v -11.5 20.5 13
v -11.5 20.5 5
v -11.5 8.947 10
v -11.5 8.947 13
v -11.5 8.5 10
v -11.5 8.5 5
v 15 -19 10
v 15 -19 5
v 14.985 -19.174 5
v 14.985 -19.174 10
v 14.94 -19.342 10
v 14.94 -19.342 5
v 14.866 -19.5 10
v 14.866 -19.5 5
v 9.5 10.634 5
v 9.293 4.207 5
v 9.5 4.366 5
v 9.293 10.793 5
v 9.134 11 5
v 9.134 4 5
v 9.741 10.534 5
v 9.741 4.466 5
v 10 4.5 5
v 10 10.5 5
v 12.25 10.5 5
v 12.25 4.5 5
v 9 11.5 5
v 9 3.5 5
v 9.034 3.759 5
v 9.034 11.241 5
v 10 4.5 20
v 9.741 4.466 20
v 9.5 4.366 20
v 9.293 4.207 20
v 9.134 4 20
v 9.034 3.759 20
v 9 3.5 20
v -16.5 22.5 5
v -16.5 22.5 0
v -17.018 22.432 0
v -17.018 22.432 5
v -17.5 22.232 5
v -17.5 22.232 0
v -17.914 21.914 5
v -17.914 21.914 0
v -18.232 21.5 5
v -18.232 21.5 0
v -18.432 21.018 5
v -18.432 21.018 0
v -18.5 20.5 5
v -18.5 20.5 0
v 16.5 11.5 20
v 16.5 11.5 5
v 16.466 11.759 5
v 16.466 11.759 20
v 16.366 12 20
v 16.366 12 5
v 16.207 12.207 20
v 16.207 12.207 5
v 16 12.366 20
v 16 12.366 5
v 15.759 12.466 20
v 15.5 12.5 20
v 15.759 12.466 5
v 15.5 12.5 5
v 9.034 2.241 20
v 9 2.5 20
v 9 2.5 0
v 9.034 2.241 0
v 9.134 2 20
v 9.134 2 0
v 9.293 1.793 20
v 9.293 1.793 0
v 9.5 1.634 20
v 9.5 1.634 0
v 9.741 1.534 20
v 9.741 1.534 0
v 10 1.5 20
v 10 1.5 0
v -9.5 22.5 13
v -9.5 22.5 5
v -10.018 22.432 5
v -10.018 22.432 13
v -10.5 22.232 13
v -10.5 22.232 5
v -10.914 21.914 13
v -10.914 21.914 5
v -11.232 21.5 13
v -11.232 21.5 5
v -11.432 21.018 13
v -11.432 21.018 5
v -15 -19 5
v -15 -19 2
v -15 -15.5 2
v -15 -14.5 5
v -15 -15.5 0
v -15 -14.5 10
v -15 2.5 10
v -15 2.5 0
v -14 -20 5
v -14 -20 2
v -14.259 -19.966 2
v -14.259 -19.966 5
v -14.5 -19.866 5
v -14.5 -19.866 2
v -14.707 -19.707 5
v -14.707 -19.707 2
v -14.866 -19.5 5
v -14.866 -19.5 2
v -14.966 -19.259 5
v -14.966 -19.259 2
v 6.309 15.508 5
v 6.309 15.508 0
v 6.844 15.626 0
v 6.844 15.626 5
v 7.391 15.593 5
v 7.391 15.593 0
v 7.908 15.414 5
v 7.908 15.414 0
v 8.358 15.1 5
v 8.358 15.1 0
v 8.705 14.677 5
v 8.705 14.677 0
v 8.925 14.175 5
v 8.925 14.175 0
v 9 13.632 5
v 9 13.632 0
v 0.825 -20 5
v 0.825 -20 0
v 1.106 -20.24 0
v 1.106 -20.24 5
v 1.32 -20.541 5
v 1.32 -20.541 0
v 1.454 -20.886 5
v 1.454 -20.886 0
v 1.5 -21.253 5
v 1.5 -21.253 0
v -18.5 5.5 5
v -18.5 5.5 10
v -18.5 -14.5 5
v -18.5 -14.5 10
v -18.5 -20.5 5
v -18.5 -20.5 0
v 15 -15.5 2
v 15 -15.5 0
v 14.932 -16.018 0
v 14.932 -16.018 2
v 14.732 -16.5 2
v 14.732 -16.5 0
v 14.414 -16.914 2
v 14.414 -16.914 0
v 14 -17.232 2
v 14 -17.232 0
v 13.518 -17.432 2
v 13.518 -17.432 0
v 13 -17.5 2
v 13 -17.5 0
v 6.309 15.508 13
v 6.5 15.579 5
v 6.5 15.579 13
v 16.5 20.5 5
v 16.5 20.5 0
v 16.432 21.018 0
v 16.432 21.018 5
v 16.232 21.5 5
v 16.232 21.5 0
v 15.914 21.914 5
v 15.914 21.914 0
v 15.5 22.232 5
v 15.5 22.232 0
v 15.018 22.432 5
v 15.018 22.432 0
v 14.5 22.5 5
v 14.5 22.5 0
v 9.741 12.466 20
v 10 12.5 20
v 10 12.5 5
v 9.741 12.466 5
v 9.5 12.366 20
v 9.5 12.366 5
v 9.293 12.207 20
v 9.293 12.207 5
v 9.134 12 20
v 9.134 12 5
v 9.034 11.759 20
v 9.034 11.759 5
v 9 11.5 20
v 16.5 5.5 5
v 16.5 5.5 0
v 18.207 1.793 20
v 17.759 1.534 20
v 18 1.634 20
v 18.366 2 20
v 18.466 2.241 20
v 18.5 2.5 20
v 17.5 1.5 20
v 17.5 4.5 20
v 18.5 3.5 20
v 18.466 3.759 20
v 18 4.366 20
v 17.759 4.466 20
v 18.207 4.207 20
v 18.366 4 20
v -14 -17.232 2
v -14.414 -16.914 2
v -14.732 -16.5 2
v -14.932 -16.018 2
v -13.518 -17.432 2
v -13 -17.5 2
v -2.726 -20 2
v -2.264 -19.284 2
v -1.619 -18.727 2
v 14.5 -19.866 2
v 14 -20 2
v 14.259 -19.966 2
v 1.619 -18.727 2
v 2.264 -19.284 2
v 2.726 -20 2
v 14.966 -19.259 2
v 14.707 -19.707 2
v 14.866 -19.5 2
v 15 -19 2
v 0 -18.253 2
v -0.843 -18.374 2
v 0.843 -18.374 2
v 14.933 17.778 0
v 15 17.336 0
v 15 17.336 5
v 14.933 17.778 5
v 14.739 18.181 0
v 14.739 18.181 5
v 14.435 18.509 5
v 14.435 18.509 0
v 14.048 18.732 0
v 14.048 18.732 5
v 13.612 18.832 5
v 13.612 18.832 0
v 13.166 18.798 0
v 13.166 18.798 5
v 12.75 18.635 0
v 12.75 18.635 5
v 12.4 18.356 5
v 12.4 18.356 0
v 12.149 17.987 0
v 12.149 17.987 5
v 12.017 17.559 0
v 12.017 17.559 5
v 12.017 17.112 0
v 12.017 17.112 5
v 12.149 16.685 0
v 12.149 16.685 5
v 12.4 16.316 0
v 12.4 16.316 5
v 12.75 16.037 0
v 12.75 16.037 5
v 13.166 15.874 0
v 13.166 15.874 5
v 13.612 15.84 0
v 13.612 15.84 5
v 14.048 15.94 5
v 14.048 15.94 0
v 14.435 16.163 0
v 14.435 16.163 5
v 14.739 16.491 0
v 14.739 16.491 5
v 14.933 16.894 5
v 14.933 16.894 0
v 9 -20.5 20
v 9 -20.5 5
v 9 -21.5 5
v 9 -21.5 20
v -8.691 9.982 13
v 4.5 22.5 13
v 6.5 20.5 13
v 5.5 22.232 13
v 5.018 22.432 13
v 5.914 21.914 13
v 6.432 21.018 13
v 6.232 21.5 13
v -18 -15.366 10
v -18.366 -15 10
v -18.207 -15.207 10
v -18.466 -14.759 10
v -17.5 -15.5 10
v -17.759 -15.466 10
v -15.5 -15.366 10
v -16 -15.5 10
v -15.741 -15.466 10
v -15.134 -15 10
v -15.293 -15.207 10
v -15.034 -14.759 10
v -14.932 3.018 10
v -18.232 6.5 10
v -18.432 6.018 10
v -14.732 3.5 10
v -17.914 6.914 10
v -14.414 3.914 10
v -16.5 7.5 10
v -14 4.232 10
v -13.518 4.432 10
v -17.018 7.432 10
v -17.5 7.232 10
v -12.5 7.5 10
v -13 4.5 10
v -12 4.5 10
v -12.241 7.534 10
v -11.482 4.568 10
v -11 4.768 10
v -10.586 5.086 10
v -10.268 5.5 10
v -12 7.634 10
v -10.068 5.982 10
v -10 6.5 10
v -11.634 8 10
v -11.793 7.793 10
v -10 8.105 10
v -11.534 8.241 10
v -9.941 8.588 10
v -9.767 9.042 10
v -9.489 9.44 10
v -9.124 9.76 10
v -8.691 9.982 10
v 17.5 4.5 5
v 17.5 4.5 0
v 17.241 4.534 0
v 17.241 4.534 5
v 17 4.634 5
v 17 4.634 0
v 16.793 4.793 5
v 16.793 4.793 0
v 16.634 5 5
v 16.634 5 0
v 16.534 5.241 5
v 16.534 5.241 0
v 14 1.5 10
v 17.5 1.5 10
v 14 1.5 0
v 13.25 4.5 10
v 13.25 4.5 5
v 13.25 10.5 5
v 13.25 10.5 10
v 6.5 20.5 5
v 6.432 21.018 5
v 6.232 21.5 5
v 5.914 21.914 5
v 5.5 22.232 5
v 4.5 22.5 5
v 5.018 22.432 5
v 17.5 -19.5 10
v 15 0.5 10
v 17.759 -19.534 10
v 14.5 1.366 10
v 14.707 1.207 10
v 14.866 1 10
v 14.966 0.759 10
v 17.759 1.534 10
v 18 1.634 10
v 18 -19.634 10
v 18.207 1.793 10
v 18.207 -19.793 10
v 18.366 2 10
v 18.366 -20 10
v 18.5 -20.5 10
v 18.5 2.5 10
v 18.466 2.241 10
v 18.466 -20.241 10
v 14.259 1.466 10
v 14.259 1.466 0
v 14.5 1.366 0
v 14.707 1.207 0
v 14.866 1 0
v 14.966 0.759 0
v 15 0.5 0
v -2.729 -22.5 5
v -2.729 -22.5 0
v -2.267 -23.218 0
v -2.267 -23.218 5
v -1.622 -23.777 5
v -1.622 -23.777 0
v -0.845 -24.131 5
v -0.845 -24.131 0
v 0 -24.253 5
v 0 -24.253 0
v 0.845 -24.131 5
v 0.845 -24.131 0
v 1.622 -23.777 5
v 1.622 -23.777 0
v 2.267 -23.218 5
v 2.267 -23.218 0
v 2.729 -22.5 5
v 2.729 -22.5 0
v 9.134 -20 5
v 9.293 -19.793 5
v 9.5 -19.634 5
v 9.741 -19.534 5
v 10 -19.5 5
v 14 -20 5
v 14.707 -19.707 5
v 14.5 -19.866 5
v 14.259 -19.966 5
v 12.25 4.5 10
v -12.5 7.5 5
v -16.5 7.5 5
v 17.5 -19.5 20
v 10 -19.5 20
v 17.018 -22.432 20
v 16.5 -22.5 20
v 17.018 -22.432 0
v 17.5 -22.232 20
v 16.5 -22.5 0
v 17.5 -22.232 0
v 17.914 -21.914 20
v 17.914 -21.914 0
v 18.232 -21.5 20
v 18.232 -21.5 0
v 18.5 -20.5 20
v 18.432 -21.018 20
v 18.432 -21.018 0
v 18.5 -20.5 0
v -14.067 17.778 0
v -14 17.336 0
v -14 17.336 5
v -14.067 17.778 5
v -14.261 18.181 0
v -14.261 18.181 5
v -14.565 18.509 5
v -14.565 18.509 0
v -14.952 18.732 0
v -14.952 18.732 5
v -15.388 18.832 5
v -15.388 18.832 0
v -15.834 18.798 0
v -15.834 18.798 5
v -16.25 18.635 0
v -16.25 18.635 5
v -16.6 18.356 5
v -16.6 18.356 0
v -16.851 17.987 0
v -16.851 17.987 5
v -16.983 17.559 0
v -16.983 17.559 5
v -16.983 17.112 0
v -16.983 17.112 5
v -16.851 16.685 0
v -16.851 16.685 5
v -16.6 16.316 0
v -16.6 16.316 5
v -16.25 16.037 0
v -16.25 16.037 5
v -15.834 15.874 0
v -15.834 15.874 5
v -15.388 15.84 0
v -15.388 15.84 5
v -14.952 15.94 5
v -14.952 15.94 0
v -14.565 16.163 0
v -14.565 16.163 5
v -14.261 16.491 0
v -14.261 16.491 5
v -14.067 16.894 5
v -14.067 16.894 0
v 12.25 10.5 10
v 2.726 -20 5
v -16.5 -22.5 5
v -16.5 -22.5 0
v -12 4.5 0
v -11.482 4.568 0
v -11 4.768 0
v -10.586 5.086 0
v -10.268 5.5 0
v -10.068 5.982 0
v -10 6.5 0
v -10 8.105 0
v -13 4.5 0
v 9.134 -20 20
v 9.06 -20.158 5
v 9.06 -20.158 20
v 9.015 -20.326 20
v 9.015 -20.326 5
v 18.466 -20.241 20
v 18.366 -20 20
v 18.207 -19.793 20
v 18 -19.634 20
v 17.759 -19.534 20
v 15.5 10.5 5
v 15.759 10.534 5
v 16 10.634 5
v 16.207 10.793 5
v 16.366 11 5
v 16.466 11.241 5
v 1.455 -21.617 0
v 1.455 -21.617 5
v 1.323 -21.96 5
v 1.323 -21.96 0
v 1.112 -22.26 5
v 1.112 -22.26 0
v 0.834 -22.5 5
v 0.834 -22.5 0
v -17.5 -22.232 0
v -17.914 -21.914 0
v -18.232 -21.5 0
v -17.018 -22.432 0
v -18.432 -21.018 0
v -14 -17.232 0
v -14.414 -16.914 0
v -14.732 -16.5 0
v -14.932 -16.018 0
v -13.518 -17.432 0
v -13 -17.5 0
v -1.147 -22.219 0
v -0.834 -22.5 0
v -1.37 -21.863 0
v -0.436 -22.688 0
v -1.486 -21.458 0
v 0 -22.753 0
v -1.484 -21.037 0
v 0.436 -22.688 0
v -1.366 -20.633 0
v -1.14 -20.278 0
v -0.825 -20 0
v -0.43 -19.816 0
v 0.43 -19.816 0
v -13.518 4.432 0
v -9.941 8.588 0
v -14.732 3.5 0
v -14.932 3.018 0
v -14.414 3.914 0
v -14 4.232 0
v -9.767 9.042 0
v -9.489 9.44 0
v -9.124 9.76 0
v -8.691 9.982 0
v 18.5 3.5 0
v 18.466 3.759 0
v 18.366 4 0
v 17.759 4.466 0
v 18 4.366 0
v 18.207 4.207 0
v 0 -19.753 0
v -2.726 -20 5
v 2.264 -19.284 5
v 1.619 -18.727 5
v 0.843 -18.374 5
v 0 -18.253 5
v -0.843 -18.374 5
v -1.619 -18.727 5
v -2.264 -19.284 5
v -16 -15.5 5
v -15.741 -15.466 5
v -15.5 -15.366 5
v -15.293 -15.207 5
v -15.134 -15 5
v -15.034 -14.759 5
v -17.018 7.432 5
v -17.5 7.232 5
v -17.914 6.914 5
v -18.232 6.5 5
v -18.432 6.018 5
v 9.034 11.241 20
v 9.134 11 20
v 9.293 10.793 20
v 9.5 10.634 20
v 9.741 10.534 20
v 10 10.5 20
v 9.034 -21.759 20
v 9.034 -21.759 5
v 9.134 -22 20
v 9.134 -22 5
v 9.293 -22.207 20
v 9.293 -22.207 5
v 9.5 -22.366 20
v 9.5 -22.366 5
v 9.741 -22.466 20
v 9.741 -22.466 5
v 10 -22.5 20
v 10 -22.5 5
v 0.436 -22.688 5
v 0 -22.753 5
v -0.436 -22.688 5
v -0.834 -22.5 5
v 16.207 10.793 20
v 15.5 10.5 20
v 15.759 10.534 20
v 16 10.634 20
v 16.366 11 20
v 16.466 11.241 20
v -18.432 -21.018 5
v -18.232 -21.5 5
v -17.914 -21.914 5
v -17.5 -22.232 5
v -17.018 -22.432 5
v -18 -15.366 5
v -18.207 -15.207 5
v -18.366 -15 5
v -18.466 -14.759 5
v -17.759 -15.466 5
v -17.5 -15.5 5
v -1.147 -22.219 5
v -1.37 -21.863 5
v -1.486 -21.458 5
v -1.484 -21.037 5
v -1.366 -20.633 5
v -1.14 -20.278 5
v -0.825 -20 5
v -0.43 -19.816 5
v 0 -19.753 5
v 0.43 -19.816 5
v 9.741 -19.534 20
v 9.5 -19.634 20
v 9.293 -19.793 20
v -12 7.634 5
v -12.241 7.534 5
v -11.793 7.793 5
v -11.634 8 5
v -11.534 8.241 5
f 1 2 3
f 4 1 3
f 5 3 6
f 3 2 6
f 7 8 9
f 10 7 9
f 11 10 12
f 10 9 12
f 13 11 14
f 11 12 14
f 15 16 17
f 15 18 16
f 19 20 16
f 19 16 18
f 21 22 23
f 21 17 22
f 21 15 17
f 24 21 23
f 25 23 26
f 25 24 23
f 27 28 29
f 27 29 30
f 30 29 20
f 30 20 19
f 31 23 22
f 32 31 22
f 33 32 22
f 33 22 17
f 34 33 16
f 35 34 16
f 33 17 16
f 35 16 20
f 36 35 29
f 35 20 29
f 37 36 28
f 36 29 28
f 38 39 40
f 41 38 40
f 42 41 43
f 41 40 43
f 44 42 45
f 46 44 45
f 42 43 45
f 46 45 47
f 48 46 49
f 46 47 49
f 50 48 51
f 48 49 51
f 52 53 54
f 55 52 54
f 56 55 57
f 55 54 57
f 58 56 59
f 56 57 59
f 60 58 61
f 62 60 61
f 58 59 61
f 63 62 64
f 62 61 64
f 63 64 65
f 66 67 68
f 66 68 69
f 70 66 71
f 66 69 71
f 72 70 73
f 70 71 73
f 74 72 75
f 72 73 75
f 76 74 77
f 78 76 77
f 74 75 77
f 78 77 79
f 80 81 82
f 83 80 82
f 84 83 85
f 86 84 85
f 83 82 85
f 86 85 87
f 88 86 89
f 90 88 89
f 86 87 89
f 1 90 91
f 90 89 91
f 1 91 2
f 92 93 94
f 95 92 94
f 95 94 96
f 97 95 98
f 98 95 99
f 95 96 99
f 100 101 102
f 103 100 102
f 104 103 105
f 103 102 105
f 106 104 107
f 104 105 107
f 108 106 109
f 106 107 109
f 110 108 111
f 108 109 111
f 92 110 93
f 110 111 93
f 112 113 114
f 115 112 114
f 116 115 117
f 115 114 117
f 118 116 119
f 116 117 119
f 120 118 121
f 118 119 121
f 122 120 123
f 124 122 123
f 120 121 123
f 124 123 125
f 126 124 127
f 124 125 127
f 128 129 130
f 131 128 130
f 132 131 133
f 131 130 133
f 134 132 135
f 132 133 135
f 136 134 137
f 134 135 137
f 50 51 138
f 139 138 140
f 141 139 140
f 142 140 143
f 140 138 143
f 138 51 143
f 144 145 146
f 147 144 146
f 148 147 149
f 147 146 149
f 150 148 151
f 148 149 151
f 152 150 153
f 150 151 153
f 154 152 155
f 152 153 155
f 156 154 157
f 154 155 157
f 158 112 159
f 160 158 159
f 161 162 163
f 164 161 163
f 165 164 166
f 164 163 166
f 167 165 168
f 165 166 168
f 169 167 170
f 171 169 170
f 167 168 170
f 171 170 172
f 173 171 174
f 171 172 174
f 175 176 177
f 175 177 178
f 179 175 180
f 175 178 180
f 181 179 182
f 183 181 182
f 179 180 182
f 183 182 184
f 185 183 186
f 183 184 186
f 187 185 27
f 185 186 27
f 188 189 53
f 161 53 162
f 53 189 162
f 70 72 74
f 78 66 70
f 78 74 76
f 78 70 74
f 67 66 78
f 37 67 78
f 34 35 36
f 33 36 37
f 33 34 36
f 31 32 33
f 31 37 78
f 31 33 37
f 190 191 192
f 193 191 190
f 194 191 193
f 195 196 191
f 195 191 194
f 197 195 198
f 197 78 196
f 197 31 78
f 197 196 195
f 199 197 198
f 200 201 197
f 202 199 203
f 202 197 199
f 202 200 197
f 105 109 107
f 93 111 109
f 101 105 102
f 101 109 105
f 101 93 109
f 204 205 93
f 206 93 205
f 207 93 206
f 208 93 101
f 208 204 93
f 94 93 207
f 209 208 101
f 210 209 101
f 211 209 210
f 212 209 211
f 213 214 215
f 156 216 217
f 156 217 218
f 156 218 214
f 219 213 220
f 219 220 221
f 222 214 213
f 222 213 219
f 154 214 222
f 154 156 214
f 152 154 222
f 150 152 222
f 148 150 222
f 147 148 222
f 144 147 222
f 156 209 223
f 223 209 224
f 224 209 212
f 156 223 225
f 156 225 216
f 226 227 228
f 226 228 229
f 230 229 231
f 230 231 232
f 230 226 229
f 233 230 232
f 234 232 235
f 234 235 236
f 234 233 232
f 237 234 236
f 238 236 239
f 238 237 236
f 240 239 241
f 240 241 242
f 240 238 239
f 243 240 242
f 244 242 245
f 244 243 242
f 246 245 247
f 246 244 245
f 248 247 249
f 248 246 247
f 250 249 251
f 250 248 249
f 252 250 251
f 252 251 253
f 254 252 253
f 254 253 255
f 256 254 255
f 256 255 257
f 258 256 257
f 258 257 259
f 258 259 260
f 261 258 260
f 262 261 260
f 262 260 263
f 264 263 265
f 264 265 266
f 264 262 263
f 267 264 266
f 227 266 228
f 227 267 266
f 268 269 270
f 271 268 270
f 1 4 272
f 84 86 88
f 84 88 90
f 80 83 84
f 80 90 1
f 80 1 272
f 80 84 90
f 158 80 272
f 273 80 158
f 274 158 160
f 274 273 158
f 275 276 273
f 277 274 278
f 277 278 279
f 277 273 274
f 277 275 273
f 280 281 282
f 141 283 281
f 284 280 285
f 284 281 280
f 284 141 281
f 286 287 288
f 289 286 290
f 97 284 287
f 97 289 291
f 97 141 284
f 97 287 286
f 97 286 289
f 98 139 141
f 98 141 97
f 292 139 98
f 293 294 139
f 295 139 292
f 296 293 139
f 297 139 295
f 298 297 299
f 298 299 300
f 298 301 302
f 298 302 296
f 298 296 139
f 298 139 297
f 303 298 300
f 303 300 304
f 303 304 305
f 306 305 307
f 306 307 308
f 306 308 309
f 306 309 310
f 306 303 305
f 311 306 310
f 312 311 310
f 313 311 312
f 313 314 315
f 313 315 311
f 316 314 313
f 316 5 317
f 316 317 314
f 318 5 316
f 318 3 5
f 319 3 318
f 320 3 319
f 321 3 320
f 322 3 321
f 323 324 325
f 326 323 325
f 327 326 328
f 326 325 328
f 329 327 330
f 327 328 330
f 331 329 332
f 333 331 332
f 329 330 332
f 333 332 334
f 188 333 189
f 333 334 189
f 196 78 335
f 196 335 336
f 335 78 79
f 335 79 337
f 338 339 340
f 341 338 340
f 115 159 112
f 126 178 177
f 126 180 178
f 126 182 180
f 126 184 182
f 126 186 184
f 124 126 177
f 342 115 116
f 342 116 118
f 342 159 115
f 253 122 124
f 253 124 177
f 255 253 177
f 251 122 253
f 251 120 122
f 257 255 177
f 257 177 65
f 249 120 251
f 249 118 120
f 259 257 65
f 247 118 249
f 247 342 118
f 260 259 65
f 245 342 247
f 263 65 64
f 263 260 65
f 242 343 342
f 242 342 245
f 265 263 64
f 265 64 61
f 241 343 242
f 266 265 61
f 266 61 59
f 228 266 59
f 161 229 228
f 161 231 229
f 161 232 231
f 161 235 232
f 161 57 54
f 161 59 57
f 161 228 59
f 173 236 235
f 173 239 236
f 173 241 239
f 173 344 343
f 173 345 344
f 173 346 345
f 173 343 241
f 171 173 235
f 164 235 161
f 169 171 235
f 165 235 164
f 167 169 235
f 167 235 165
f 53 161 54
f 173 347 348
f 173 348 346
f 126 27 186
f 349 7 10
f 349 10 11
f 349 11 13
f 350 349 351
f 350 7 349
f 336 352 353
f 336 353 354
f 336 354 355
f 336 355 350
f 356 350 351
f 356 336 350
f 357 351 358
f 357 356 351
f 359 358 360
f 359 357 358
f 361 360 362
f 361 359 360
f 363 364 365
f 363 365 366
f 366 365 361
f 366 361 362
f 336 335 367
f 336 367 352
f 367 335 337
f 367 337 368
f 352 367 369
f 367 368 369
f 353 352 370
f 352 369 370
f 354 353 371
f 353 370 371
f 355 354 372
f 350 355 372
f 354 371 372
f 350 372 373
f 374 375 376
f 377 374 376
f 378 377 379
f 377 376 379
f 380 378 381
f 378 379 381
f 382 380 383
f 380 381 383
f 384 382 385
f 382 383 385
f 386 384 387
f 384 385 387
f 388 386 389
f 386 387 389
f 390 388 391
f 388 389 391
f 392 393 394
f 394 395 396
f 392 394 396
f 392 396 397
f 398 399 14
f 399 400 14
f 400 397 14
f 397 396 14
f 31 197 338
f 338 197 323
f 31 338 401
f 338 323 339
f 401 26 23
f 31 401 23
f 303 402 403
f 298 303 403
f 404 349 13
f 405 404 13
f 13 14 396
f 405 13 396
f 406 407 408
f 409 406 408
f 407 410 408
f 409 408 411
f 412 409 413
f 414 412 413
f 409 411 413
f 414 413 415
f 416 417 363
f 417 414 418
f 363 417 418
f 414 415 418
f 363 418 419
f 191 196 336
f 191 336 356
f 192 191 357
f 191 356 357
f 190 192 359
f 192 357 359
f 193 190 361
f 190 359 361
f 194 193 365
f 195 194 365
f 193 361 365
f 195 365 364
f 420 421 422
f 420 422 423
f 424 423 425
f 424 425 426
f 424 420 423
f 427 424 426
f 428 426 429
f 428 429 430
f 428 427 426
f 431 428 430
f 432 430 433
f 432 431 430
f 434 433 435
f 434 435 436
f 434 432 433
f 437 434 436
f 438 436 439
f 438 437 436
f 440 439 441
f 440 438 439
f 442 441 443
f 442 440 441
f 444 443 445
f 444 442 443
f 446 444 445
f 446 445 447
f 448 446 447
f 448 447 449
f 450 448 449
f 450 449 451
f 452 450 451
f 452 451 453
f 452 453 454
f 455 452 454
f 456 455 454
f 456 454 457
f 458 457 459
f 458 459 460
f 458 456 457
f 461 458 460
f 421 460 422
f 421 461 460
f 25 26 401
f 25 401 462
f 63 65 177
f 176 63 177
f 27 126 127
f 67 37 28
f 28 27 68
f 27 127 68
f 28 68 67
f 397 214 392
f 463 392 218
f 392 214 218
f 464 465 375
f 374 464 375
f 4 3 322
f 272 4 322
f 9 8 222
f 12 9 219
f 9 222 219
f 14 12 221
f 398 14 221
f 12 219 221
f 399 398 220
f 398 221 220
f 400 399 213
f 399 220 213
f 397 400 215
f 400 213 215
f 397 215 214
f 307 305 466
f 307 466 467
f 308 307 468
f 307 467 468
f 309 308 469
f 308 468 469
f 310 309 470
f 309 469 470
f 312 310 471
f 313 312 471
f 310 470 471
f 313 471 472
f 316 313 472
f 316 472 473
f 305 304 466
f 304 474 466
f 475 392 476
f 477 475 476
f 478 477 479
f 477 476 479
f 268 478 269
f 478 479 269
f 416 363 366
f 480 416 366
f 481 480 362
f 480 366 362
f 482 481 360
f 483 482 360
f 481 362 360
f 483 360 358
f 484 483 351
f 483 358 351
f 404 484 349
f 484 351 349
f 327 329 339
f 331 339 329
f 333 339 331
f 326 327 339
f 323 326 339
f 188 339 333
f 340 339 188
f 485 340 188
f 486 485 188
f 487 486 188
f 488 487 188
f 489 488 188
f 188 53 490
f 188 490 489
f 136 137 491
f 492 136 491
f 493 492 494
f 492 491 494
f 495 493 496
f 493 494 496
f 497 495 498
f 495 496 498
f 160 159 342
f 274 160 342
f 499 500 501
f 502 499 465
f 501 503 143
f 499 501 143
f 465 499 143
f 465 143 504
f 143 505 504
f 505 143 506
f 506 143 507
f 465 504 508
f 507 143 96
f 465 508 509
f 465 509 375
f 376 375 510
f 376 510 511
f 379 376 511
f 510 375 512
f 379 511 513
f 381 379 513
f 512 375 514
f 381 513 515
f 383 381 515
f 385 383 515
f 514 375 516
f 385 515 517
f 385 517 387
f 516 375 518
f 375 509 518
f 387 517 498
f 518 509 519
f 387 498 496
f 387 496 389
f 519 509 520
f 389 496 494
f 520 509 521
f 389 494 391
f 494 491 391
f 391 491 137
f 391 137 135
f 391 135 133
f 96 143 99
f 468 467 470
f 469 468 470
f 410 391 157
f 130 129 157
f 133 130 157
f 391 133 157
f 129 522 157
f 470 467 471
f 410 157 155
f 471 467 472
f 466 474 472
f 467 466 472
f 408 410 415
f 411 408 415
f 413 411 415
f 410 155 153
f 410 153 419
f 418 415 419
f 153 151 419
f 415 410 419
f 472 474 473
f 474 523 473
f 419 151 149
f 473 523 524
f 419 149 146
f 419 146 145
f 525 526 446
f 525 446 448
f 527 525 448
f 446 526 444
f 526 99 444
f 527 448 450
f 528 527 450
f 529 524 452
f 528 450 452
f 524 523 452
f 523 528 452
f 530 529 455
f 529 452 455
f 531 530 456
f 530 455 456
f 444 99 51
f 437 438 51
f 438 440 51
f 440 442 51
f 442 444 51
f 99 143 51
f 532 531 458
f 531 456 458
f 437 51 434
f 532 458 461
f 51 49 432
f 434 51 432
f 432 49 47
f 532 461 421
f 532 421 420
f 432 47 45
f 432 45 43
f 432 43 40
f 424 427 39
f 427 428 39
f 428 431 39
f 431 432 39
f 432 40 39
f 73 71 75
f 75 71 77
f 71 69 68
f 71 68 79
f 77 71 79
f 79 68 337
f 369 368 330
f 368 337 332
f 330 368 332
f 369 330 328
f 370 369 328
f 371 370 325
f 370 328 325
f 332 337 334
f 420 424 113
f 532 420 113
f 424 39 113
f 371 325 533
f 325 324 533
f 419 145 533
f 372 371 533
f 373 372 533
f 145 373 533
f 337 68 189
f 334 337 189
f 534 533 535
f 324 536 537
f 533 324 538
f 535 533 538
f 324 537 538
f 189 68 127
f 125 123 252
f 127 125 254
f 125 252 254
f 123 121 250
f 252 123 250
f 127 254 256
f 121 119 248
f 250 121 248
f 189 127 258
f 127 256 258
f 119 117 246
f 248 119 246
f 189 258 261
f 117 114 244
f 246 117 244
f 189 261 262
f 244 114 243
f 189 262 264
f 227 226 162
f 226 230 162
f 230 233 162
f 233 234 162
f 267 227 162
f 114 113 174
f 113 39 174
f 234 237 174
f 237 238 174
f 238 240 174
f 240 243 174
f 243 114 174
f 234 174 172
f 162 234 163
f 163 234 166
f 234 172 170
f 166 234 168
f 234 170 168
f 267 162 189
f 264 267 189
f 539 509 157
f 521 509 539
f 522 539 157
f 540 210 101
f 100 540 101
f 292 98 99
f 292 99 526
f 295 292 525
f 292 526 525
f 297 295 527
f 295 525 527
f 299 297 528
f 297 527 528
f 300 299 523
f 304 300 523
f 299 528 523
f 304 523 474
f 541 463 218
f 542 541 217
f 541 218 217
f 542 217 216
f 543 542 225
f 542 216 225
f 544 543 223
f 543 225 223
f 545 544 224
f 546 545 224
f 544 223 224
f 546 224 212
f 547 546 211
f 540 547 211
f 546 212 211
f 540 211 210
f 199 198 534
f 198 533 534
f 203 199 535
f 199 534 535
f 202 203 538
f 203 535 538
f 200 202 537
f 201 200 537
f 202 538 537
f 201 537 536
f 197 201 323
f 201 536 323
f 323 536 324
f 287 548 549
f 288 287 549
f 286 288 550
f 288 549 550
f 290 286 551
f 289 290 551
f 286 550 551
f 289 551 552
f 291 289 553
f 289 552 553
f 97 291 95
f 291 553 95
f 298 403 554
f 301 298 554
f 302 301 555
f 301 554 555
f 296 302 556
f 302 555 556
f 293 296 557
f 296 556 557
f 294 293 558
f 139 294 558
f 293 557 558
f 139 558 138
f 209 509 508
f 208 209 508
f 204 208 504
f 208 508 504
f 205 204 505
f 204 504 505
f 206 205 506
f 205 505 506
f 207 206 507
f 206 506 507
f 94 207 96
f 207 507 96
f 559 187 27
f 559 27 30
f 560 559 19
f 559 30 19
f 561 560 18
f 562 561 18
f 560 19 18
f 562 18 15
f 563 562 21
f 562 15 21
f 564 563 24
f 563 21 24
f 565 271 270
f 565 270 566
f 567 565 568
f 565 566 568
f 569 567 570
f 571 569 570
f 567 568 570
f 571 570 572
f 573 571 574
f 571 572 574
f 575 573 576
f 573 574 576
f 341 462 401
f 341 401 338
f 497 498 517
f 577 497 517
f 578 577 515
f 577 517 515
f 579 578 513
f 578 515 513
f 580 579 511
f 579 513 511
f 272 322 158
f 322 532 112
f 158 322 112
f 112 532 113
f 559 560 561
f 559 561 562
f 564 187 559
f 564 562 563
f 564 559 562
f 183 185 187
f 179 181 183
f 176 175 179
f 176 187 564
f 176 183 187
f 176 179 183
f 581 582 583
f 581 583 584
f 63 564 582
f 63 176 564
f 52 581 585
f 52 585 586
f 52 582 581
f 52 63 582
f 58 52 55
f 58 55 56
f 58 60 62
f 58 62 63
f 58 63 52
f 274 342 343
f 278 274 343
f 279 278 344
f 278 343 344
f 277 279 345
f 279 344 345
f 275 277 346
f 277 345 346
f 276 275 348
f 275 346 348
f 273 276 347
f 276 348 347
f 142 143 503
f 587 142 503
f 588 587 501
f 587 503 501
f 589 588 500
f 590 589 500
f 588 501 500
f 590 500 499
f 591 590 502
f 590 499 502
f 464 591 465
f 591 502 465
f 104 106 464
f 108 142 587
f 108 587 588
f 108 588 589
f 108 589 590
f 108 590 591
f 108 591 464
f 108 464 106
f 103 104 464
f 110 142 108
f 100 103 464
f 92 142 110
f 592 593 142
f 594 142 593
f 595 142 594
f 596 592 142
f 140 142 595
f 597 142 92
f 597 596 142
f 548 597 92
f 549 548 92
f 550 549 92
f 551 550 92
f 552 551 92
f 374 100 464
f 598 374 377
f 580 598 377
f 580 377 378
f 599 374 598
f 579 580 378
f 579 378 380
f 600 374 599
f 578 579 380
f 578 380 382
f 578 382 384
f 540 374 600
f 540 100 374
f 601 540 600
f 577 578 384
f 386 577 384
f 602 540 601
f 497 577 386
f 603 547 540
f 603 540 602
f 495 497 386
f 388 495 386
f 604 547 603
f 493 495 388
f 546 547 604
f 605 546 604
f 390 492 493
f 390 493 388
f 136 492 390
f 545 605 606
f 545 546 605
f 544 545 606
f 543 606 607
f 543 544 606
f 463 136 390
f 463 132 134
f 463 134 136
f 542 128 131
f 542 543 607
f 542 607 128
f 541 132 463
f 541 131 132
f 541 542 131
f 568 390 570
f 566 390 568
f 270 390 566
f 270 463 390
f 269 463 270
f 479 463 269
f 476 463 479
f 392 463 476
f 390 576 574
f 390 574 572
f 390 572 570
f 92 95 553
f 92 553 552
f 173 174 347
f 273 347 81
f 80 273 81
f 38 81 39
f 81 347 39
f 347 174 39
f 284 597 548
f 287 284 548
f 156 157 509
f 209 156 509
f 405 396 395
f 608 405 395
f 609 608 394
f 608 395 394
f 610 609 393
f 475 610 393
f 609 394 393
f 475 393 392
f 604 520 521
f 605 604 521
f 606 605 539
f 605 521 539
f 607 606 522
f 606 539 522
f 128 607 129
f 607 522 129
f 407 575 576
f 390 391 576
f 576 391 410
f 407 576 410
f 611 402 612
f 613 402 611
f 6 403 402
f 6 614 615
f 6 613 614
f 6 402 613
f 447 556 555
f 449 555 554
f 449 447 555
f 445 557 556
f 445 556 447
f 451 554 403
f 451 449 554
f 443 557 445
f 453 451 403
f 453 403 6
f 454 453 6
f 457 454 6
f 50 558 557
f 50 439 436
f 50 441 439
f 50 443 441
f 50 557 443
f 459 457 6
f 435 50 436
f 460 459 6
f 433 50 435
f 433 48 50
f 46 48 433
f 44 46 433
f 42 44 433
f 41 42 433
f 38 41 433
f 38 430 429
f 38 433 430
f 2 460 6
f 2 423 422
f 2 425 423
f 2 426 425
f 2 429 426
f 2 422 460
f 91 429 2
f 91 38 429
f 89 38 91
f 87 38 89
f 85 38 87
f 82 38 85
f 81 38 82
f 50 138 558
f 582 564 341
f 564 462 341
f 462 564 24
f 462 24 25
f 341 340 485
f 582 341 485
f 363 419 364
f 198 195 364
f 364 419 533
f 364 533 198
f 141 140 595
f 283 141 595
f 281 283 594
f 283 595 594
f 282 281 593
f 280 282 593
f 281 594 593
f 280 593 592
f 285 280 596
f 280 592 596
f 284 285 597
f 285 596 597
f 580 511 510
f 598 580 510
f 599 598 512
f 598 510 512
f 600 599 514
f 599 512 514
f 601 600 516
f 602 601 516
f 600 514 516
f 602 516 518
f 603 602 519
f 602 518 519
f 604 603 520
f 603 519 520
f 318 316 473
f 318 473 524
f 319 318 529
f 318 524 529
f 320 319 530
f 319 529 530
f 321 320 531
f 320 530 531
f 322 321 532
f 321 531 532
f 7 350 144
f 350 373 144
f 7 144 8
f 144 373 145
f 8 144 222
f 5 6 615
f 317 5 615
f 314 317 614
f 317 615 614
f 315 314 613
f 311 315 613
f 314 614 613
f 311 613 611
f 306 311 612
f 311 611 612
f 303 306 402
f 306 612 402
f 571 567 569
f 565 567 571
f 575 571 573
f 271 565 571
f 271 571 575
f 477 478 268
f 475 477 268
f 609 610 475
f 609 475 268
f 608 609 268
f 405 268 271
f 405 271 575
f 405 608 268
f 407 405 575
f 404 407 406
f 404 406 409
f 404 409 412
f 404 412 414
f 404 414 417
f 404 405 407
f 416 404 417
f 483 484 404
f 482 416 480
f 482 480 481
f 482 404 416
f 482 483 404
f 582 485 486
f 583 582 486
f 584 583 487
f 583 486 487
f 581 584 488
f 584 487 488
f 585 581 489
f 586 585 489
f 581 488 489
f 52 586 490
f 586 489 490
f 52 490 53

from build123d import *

# Parameters (mm, degrees)
F1_DEPTH = 2
F0_R     = 3
F0_R_2   = 1.5
F2_DEPTH = 5
F4_DEPTH = 5
F5_DEPTH = 8
F6_DEPTH = 15
F7_DEPTH = 15
F3_W     = 1
F3_H     = 6
F8_DEPTH = 5


with BuildPart() as f1:
    # F0 (on Top) → F1 (new body)
    with BuildSketch(Plane.XY):
        with BuildLine():
            Line((-14, -20), (-2.7258296596, -20))
            ThreePointArc((-2.7258296596, -20), (0, -18.2529376149), (2.7258296596, -20))
            Line((2.7258296596, -20), (14, -20))
            ThreePointArc((14, -20), (14.7071067812, -19.7071067812), (15, -19))
            Line((15, -19), (15, -15.5))
            ThreePointArc((15, -15.5), (14.4142135624, -16.9142135624), (13, -17.5))
            Line((13, -17.5), (-13, -17.5))
            ThreePointArc((-13, -17.5), (-14.4142135624, -16.9142135624), (-15, -15.5))
            Line((-15, -15.5), (-15, -19))
            ThreePointArc((-15, -19), (-14.7071067812, -19.7071067812), (-14, -20))
        make_face()
    extrude(amount=F1_DEPTH)

    # F0 (on Top) → F2 (join)
    with BuildSketch(Plane.XY):
        with BuildLine():
            ThreePointArc((16.5, 20.5), (15.9142135624, 21.9142135624), (14.5, 22.5))
            Line((14.5, 22.5), (-16.5, 22.5))
            ThreePointArc((-16.5, 22.5), (-17.9142135624, 21.9142135624), (-18.5, 20.5))
            Line((-18.5, 20.5), (-18.5, 17.3358949354))
            Line((-18.5, 17.3358949354), (-18.5, -20.5))
            ThreePointArc((-18.5, -20.5), (-17.9142135624, -21.9142135624), (-16.5, -22.5))
            Line((-16.5, -22.5), (-2.7285225687, -22.5))
            ThreePointArc((-2.7285225687, -22.5), (-2.9999982596, -21.2497061259), (-2.7258296596, -20))
            Line((-2.7258296596, -20), (-14, -20))
            ThreePointArc((-14, -20), (-14.7071067812, -19.7071067812), (-15, -19))
            Line((-15, -19), (-15, -15.5))
            Line((-15, -15.5), (-15, 2.5))
            ThreePointArc((-15, 2.5), (-14.4142135624, 3.9142135624), (-13, 4.5))
            Line((-13, 4.5), (-12, 4.5))
            ThreePointArc((-12, 4.5), (-10.5857864376, 5.0857864376), (-10, 6.5))
            Line((-10, 6.5), (-10, 8.1054256072))
            ThreePointArc((-10, 8.1054256072), (-9.6405519552, 9.2493614806), (-8.6914107177, 9.9821118409))
            Line((-8.6914107177, 9.9821118409), (6.3085892823, 15.5084276303))
            ThreePointArc((6.3085892823, 15.5084276303), (8.1439358734, 15.2722933519), (9, 13.6317413967))
            Line((9, 13.6317413967), (9, 2.5))
            ThreePointArc((9, 2.5), (9.2928932188, 1.7928932188), (10, 1.5))
            Line((10, 1.5), (14, 1.5))
            ThreePointArc((14, 1.5), (14.7071067812, 1.2071067812), (15, 0.5))
            Line((15, 0.5), (15, -15.5))
            Line((15, -15.5), (15, -19))
            ThreePointArc((15, -19), (14.7071067812, -19.7071067812), (14, -20))
            Line((14, -20), (2.7258296596, -20))
            ThreePointArc((2.7258296596, -20), (2.9306559828, -20.6116455515), (3, -21.2529376149))
            ThreePointArc((3, -21.2529376149), (2.9313450587, -21.8910725121), (2.7285225687, -22.5))
            Line((2.7285225687, -22.5), (16.5, -22.5))
            ThreePointArc((16.5, -22.5), (17.9142135624, -21.9142135624), (18.5, -20.5))
            Line((18.5, -20.5), (18.5, 3.5))
            ThreePointArc((18.5, 3.5), (18.2071067812, 4.2071067812), (17.5, 4.5))
            ThreePointArc((17.5, 4.5), (16.7928932188, 4.7928932188), (16.5, 5.5))
            Line((16.5, 5.5), (16.5, 17.3358949354))
            Line((16.5, 17.3358949354), (16.5, 20.5))
        make_face()
        with BuildLine():
            ThreePointArc((-12.5, 17.3358949354), (-15.5, 14.3358949354), (-18.5, 17.3358949354))
            ThreePointArc((-18.5, 17.3358949354), (-15.5, 20.3358949354), (-12.5, 17.3358949354))
        make_face(mode=Mode.SUBTRACT)
        with Locations((13.5, 17.3358949354)):
            Circle(F0_R, mode=Mode.SUBTRACT)
        with BuildLine():
            ThreePointArc((-2.7258296596, -20), (-2.9999982596, -21.2497061259), (-2.7285225687, -22.5))
            Line((-2.7285225687, -22.5), (-0.8335678783, -22.5))
            ThreePointArc((-0.8335678783, -22.5), (-1.4999905856, -21.2476231938), (-0.8247104541, -20))
            Line((-0.8247104541, -20), (-2.7258296596, -20))
        make_face()
        with BuildLine():
            Line((-0.8335678783, -22.5), (-2.7285225687, -22.5))
            ThreePointArc((-2.7285225687, -22.5), (0, -24.2529376149), (2.7285225687, -22.5))
            Line((2.7285225687, -22.5), (0.8335678783, -22.5))
            ThreePointArc((0.8335678783, -22.5), (0, -22.7529376149), (-0.8335678783, -22.5))
        make_face()
        with BuildLine():
            Line((0.8335678783, -22.5), (2.7285225687, -22.5))
            ThreePointArc((2.7285225687, -22.5), (2.9313450587, -21.8910725121), (3, -21.2529376149))
            ThreePointArc((3, -21.2529376149), (2.9306559828, -20.6116455515), (2.7258296596, -20))
            Line((2.7258296596, -20), (0.8247104541, -20))
            ThreePointArc((0.8247104541, -20), (1.3204290366, -20.5412725537), (1.5, -21.2529376149))
            ThreePointArc((1.5, -21.2529376149), (1.3229421411, -21.9599199989), (0.8335678783, -22.5))
        make_face()
        with BuildLine():
            ThreePointArc((2.7258296596, -20), (0, -18.2529376149), (-2.7258296596, -20))
            Line((-2.7258296596, -20), (-0.8247104541, -20))
            ThreePointArc((-0.8247104541, -20), (0, -19.7529376149), (0.8247104541, -20))
            Line((0.8247104541, -20), (2.7258296596, -20))
        make_face()
        with BuildLine():
            ThreePointArc((-12.5, 17.3358949354), (-15.5, 20.3358949354), (-18.5, 17.3358949354))
            ThreePointArc((-18.5, 17.3358949354), (-15.5, 14.3358949354), (-12.5, 17.3358949354))
        make_face()
        with Locations((-15.5, 17.3358949354)):
            Circle(F0_R_2, mode=Mode.SUBTRACT)
        with Locations((13.5, 17.3358949354)):
            Circle(F0_R)
        with Locations((13.5, 17.3358949354)):
            Circle(F0_R_2, mode=Mode.SUBTRACT)
    extrude(amount=F2_DEPTH)

    # F3 (on face) → F4 (join)
    with BuildSketch(Plane.XY.offset(5)):
        with BuildLine():
            ThreePointArc((-18.5, -14.5), (-18.2071067812, -15.2071067812), (-17.5, -15.5))
            Line((-17.5, -15.5), (-16, -15.5))
            ThreePointArc((-16, -15.5), (-15.2928932188, -15.2071067812), (-15, -14.5))
            Line((-15, -14.5), (-15, 2.5))
            ThreePointArc((-15, 2.5), (-14.4142135624, 3.9142135624), (-13, 4.5))
            Line((-13, 4.5), (-12, 4.5))
            ThreePointArc((-12, 4.5), (-10.5857864376, 5.0857864376), (-10, 6.5))
            Line((-10, 6.5), (-10, 8.1054256072))
            ThreePointArc((-10, 8.1054256072), (-9.6405519552, 9.2493614806), (-8.6914107177, 9.9821118409))
            Line((-8.6914107177, 9.9821118409), (-11.5, 8.9473684211))
            Line((-11.5, 8.9473684211), (-11.5, 8.5))
            ThreePointArc((-11.5, 8.5), (-11.7928932188, 7.7928932188), (-12.5, 7.5))
            Line((-12.5, 7.5), (-16.5, 7.5))
            ThreePointArc((-16.5, 7.5), (-17.9142135624, 6.9142135624), (-18.5, 5.5))
            Line((-18.5, 5.5), (-18.5, -14.5))
        make_face()
    extrude(amount=F4_DEPTH)

    # F3 (on face) → F5 (join)
    with BuildSketch(Plane.XY.offset(5)):
        with BuildLine():
            Line((4.5, 22.5), (-9.5, 22.5))
            ThreePointArc((-9.5, 22.5), (-10.9142135624, 21.9142135624), (-11.5, 20.5))
            Line((-11.5, 20.5), (-11.5, 8.9473684211))
            Line((-11.5, 8.9473684211), (-8.6914107177, 9.9821118409))
            Line((-8.6914107177, 9.9821118409), (6.3085892823, 15.5084276303))
            Line((6.3085892823, 15.5084276303), (6.5, 15.5789473684))
            Line((6.5, 15.5789473684), (6.5, 20.5))
            ThreePointArc((6.5, 20.5), (5.9142135624, 21.9142135624), (4.5, 22.5))
        make_face()
    extrude(amount=F5_DEPTH)

    # F3 (on face) → F6 (join)
    with BuildSketch(Plane.XY.offset(5)):
        with BuildLine():
            ThreePointArc((9, -21.5), (9.2928932188, -22.2071067812), (10, -22.5))
            Line((10, -22.5), (16.5, -22.5))
            ThreePointArc((16.5, -22.5), (17.9142135624, -21.9142135624), (18.5, -20.5))
            ThreePointArc((18.5, -20.5), (18.2071067812, -19.7928932188), (17.5, -19.5))
            Line((17.5, -19.5), (14.8660254038, -19.5))
            ThreePointArc((14.8660254038, -19.5), (14.5, -19.8660254038), (14, -20))
            Line((14, -20), (9.1339745962, -20))
            ThreePointArc((9.1339745962, -20), (9.0340741737, -20.2411809549), (9, -20.5))
            Line((9, -20.5), (9, -21.5))
        make_face()
        with BuildLine():
            ThreePointArc((10, -19.5), (9.5, -19.6339745962), (9.1339745962, -20))
            Line((9.1339745962, -20), (14, -20))
            ThreePointArc((14, -20), (14.5, -19.8660254038), (14.8660254038, -19.5))
            Line((14.8660254038, -19.5), (10, -19.5))
        make_face()
    extrude(amount=F6_DEPTH)

    # F3 (on face) → F7 (join)
    with BuildSketch(Plane.XY.offset(5)):
        with BuildLine():
            ThreePointArc((15.5, 10.5), (16.2071067812, 10.7928932188), (16.5, 11.5))
            ThreePointArc((16.5, 11.5), (16.2071067812, 12.2071067812), (15.5, 12.5))
            Line((15.5, 12.5), (10, 12.5))
            ThreePointArc((10, 12.5), (9.2928932188, 12.2071067812), (9, 11.5))
            ThreePointArc((9, 11.5), (9.2928932188, 10.7928932188), (10, 10.5))
            Line((10, 10.5), (12.25, 10.5))
            Line((12.25, 10.5), (13.25, 10.5))
            Line((13.25, 10.5), (15.5, 10.5))
        make_face()
        with BuildLine():
            ThreePointArc((17.5, 1.5), (18.2071067812, 1.7928932188), (18.5, 2.5))
            Line((18.5, 2.5), (18.5, 3.5))
            ThreePointArc((18.5, 3.5), (18.2071067812, 4.2071067812), (17.5, 4.5))
            Line((17.5, 4.5), (13.25, 4.5))
            Line((13.25, 4.5), (12.25, 4.5))
            Line((12.25, 4.5), (10, 4.5))
            ThreePointArc((10, 4.5), (9.2928932188, 4.2071067812), (9, 3.5))
            Line((9, 3.5), (9, 2.5))
            ThreePointArc((9, 2.5), (9.2928932188, 1.7928932188), (10, 1.5))
            Line((10, 1.5), (14, 1.5))
            Line((14, 1.5), (17.5, 1.5))
        make_face()
    extrude(amount=F7_DEPTH)

    # F3 (on face) → F8 (join)
    with BuildSketch(Plane.XY.offset(5)):
        with Locations((12.75, 7.5)):
            Rectangle(F3_W, F3_H)
        with BuildLine():
            ThreePointArc((17.5, -19.5), (18.2071067812, -19.7928932188), (18.5, -20.5))
            Line((18.5, -20.5), (18.5, 2.5))
            ThreePointArc((18.5, 2.5), (18.2071067812, 1.7928932188), (17.5, 1.5))
            Line((17.5, 1.5), (14, 1.5))
            ThreePointArc((14, 1.5), (14.7071067812, 1.2071067812), (15, 0.5))
            Line((15, 0.5), (15, -19))
            ThreePointArc((15, -19), (14.9659258263, -19.2588190451), (14.8660254038, -19.5))
            Line((14.8660254038, -19.5), (17.5, -19.5))
        make_face()
    extrude(amount=F8_DEPTH)


solid = f1.part
